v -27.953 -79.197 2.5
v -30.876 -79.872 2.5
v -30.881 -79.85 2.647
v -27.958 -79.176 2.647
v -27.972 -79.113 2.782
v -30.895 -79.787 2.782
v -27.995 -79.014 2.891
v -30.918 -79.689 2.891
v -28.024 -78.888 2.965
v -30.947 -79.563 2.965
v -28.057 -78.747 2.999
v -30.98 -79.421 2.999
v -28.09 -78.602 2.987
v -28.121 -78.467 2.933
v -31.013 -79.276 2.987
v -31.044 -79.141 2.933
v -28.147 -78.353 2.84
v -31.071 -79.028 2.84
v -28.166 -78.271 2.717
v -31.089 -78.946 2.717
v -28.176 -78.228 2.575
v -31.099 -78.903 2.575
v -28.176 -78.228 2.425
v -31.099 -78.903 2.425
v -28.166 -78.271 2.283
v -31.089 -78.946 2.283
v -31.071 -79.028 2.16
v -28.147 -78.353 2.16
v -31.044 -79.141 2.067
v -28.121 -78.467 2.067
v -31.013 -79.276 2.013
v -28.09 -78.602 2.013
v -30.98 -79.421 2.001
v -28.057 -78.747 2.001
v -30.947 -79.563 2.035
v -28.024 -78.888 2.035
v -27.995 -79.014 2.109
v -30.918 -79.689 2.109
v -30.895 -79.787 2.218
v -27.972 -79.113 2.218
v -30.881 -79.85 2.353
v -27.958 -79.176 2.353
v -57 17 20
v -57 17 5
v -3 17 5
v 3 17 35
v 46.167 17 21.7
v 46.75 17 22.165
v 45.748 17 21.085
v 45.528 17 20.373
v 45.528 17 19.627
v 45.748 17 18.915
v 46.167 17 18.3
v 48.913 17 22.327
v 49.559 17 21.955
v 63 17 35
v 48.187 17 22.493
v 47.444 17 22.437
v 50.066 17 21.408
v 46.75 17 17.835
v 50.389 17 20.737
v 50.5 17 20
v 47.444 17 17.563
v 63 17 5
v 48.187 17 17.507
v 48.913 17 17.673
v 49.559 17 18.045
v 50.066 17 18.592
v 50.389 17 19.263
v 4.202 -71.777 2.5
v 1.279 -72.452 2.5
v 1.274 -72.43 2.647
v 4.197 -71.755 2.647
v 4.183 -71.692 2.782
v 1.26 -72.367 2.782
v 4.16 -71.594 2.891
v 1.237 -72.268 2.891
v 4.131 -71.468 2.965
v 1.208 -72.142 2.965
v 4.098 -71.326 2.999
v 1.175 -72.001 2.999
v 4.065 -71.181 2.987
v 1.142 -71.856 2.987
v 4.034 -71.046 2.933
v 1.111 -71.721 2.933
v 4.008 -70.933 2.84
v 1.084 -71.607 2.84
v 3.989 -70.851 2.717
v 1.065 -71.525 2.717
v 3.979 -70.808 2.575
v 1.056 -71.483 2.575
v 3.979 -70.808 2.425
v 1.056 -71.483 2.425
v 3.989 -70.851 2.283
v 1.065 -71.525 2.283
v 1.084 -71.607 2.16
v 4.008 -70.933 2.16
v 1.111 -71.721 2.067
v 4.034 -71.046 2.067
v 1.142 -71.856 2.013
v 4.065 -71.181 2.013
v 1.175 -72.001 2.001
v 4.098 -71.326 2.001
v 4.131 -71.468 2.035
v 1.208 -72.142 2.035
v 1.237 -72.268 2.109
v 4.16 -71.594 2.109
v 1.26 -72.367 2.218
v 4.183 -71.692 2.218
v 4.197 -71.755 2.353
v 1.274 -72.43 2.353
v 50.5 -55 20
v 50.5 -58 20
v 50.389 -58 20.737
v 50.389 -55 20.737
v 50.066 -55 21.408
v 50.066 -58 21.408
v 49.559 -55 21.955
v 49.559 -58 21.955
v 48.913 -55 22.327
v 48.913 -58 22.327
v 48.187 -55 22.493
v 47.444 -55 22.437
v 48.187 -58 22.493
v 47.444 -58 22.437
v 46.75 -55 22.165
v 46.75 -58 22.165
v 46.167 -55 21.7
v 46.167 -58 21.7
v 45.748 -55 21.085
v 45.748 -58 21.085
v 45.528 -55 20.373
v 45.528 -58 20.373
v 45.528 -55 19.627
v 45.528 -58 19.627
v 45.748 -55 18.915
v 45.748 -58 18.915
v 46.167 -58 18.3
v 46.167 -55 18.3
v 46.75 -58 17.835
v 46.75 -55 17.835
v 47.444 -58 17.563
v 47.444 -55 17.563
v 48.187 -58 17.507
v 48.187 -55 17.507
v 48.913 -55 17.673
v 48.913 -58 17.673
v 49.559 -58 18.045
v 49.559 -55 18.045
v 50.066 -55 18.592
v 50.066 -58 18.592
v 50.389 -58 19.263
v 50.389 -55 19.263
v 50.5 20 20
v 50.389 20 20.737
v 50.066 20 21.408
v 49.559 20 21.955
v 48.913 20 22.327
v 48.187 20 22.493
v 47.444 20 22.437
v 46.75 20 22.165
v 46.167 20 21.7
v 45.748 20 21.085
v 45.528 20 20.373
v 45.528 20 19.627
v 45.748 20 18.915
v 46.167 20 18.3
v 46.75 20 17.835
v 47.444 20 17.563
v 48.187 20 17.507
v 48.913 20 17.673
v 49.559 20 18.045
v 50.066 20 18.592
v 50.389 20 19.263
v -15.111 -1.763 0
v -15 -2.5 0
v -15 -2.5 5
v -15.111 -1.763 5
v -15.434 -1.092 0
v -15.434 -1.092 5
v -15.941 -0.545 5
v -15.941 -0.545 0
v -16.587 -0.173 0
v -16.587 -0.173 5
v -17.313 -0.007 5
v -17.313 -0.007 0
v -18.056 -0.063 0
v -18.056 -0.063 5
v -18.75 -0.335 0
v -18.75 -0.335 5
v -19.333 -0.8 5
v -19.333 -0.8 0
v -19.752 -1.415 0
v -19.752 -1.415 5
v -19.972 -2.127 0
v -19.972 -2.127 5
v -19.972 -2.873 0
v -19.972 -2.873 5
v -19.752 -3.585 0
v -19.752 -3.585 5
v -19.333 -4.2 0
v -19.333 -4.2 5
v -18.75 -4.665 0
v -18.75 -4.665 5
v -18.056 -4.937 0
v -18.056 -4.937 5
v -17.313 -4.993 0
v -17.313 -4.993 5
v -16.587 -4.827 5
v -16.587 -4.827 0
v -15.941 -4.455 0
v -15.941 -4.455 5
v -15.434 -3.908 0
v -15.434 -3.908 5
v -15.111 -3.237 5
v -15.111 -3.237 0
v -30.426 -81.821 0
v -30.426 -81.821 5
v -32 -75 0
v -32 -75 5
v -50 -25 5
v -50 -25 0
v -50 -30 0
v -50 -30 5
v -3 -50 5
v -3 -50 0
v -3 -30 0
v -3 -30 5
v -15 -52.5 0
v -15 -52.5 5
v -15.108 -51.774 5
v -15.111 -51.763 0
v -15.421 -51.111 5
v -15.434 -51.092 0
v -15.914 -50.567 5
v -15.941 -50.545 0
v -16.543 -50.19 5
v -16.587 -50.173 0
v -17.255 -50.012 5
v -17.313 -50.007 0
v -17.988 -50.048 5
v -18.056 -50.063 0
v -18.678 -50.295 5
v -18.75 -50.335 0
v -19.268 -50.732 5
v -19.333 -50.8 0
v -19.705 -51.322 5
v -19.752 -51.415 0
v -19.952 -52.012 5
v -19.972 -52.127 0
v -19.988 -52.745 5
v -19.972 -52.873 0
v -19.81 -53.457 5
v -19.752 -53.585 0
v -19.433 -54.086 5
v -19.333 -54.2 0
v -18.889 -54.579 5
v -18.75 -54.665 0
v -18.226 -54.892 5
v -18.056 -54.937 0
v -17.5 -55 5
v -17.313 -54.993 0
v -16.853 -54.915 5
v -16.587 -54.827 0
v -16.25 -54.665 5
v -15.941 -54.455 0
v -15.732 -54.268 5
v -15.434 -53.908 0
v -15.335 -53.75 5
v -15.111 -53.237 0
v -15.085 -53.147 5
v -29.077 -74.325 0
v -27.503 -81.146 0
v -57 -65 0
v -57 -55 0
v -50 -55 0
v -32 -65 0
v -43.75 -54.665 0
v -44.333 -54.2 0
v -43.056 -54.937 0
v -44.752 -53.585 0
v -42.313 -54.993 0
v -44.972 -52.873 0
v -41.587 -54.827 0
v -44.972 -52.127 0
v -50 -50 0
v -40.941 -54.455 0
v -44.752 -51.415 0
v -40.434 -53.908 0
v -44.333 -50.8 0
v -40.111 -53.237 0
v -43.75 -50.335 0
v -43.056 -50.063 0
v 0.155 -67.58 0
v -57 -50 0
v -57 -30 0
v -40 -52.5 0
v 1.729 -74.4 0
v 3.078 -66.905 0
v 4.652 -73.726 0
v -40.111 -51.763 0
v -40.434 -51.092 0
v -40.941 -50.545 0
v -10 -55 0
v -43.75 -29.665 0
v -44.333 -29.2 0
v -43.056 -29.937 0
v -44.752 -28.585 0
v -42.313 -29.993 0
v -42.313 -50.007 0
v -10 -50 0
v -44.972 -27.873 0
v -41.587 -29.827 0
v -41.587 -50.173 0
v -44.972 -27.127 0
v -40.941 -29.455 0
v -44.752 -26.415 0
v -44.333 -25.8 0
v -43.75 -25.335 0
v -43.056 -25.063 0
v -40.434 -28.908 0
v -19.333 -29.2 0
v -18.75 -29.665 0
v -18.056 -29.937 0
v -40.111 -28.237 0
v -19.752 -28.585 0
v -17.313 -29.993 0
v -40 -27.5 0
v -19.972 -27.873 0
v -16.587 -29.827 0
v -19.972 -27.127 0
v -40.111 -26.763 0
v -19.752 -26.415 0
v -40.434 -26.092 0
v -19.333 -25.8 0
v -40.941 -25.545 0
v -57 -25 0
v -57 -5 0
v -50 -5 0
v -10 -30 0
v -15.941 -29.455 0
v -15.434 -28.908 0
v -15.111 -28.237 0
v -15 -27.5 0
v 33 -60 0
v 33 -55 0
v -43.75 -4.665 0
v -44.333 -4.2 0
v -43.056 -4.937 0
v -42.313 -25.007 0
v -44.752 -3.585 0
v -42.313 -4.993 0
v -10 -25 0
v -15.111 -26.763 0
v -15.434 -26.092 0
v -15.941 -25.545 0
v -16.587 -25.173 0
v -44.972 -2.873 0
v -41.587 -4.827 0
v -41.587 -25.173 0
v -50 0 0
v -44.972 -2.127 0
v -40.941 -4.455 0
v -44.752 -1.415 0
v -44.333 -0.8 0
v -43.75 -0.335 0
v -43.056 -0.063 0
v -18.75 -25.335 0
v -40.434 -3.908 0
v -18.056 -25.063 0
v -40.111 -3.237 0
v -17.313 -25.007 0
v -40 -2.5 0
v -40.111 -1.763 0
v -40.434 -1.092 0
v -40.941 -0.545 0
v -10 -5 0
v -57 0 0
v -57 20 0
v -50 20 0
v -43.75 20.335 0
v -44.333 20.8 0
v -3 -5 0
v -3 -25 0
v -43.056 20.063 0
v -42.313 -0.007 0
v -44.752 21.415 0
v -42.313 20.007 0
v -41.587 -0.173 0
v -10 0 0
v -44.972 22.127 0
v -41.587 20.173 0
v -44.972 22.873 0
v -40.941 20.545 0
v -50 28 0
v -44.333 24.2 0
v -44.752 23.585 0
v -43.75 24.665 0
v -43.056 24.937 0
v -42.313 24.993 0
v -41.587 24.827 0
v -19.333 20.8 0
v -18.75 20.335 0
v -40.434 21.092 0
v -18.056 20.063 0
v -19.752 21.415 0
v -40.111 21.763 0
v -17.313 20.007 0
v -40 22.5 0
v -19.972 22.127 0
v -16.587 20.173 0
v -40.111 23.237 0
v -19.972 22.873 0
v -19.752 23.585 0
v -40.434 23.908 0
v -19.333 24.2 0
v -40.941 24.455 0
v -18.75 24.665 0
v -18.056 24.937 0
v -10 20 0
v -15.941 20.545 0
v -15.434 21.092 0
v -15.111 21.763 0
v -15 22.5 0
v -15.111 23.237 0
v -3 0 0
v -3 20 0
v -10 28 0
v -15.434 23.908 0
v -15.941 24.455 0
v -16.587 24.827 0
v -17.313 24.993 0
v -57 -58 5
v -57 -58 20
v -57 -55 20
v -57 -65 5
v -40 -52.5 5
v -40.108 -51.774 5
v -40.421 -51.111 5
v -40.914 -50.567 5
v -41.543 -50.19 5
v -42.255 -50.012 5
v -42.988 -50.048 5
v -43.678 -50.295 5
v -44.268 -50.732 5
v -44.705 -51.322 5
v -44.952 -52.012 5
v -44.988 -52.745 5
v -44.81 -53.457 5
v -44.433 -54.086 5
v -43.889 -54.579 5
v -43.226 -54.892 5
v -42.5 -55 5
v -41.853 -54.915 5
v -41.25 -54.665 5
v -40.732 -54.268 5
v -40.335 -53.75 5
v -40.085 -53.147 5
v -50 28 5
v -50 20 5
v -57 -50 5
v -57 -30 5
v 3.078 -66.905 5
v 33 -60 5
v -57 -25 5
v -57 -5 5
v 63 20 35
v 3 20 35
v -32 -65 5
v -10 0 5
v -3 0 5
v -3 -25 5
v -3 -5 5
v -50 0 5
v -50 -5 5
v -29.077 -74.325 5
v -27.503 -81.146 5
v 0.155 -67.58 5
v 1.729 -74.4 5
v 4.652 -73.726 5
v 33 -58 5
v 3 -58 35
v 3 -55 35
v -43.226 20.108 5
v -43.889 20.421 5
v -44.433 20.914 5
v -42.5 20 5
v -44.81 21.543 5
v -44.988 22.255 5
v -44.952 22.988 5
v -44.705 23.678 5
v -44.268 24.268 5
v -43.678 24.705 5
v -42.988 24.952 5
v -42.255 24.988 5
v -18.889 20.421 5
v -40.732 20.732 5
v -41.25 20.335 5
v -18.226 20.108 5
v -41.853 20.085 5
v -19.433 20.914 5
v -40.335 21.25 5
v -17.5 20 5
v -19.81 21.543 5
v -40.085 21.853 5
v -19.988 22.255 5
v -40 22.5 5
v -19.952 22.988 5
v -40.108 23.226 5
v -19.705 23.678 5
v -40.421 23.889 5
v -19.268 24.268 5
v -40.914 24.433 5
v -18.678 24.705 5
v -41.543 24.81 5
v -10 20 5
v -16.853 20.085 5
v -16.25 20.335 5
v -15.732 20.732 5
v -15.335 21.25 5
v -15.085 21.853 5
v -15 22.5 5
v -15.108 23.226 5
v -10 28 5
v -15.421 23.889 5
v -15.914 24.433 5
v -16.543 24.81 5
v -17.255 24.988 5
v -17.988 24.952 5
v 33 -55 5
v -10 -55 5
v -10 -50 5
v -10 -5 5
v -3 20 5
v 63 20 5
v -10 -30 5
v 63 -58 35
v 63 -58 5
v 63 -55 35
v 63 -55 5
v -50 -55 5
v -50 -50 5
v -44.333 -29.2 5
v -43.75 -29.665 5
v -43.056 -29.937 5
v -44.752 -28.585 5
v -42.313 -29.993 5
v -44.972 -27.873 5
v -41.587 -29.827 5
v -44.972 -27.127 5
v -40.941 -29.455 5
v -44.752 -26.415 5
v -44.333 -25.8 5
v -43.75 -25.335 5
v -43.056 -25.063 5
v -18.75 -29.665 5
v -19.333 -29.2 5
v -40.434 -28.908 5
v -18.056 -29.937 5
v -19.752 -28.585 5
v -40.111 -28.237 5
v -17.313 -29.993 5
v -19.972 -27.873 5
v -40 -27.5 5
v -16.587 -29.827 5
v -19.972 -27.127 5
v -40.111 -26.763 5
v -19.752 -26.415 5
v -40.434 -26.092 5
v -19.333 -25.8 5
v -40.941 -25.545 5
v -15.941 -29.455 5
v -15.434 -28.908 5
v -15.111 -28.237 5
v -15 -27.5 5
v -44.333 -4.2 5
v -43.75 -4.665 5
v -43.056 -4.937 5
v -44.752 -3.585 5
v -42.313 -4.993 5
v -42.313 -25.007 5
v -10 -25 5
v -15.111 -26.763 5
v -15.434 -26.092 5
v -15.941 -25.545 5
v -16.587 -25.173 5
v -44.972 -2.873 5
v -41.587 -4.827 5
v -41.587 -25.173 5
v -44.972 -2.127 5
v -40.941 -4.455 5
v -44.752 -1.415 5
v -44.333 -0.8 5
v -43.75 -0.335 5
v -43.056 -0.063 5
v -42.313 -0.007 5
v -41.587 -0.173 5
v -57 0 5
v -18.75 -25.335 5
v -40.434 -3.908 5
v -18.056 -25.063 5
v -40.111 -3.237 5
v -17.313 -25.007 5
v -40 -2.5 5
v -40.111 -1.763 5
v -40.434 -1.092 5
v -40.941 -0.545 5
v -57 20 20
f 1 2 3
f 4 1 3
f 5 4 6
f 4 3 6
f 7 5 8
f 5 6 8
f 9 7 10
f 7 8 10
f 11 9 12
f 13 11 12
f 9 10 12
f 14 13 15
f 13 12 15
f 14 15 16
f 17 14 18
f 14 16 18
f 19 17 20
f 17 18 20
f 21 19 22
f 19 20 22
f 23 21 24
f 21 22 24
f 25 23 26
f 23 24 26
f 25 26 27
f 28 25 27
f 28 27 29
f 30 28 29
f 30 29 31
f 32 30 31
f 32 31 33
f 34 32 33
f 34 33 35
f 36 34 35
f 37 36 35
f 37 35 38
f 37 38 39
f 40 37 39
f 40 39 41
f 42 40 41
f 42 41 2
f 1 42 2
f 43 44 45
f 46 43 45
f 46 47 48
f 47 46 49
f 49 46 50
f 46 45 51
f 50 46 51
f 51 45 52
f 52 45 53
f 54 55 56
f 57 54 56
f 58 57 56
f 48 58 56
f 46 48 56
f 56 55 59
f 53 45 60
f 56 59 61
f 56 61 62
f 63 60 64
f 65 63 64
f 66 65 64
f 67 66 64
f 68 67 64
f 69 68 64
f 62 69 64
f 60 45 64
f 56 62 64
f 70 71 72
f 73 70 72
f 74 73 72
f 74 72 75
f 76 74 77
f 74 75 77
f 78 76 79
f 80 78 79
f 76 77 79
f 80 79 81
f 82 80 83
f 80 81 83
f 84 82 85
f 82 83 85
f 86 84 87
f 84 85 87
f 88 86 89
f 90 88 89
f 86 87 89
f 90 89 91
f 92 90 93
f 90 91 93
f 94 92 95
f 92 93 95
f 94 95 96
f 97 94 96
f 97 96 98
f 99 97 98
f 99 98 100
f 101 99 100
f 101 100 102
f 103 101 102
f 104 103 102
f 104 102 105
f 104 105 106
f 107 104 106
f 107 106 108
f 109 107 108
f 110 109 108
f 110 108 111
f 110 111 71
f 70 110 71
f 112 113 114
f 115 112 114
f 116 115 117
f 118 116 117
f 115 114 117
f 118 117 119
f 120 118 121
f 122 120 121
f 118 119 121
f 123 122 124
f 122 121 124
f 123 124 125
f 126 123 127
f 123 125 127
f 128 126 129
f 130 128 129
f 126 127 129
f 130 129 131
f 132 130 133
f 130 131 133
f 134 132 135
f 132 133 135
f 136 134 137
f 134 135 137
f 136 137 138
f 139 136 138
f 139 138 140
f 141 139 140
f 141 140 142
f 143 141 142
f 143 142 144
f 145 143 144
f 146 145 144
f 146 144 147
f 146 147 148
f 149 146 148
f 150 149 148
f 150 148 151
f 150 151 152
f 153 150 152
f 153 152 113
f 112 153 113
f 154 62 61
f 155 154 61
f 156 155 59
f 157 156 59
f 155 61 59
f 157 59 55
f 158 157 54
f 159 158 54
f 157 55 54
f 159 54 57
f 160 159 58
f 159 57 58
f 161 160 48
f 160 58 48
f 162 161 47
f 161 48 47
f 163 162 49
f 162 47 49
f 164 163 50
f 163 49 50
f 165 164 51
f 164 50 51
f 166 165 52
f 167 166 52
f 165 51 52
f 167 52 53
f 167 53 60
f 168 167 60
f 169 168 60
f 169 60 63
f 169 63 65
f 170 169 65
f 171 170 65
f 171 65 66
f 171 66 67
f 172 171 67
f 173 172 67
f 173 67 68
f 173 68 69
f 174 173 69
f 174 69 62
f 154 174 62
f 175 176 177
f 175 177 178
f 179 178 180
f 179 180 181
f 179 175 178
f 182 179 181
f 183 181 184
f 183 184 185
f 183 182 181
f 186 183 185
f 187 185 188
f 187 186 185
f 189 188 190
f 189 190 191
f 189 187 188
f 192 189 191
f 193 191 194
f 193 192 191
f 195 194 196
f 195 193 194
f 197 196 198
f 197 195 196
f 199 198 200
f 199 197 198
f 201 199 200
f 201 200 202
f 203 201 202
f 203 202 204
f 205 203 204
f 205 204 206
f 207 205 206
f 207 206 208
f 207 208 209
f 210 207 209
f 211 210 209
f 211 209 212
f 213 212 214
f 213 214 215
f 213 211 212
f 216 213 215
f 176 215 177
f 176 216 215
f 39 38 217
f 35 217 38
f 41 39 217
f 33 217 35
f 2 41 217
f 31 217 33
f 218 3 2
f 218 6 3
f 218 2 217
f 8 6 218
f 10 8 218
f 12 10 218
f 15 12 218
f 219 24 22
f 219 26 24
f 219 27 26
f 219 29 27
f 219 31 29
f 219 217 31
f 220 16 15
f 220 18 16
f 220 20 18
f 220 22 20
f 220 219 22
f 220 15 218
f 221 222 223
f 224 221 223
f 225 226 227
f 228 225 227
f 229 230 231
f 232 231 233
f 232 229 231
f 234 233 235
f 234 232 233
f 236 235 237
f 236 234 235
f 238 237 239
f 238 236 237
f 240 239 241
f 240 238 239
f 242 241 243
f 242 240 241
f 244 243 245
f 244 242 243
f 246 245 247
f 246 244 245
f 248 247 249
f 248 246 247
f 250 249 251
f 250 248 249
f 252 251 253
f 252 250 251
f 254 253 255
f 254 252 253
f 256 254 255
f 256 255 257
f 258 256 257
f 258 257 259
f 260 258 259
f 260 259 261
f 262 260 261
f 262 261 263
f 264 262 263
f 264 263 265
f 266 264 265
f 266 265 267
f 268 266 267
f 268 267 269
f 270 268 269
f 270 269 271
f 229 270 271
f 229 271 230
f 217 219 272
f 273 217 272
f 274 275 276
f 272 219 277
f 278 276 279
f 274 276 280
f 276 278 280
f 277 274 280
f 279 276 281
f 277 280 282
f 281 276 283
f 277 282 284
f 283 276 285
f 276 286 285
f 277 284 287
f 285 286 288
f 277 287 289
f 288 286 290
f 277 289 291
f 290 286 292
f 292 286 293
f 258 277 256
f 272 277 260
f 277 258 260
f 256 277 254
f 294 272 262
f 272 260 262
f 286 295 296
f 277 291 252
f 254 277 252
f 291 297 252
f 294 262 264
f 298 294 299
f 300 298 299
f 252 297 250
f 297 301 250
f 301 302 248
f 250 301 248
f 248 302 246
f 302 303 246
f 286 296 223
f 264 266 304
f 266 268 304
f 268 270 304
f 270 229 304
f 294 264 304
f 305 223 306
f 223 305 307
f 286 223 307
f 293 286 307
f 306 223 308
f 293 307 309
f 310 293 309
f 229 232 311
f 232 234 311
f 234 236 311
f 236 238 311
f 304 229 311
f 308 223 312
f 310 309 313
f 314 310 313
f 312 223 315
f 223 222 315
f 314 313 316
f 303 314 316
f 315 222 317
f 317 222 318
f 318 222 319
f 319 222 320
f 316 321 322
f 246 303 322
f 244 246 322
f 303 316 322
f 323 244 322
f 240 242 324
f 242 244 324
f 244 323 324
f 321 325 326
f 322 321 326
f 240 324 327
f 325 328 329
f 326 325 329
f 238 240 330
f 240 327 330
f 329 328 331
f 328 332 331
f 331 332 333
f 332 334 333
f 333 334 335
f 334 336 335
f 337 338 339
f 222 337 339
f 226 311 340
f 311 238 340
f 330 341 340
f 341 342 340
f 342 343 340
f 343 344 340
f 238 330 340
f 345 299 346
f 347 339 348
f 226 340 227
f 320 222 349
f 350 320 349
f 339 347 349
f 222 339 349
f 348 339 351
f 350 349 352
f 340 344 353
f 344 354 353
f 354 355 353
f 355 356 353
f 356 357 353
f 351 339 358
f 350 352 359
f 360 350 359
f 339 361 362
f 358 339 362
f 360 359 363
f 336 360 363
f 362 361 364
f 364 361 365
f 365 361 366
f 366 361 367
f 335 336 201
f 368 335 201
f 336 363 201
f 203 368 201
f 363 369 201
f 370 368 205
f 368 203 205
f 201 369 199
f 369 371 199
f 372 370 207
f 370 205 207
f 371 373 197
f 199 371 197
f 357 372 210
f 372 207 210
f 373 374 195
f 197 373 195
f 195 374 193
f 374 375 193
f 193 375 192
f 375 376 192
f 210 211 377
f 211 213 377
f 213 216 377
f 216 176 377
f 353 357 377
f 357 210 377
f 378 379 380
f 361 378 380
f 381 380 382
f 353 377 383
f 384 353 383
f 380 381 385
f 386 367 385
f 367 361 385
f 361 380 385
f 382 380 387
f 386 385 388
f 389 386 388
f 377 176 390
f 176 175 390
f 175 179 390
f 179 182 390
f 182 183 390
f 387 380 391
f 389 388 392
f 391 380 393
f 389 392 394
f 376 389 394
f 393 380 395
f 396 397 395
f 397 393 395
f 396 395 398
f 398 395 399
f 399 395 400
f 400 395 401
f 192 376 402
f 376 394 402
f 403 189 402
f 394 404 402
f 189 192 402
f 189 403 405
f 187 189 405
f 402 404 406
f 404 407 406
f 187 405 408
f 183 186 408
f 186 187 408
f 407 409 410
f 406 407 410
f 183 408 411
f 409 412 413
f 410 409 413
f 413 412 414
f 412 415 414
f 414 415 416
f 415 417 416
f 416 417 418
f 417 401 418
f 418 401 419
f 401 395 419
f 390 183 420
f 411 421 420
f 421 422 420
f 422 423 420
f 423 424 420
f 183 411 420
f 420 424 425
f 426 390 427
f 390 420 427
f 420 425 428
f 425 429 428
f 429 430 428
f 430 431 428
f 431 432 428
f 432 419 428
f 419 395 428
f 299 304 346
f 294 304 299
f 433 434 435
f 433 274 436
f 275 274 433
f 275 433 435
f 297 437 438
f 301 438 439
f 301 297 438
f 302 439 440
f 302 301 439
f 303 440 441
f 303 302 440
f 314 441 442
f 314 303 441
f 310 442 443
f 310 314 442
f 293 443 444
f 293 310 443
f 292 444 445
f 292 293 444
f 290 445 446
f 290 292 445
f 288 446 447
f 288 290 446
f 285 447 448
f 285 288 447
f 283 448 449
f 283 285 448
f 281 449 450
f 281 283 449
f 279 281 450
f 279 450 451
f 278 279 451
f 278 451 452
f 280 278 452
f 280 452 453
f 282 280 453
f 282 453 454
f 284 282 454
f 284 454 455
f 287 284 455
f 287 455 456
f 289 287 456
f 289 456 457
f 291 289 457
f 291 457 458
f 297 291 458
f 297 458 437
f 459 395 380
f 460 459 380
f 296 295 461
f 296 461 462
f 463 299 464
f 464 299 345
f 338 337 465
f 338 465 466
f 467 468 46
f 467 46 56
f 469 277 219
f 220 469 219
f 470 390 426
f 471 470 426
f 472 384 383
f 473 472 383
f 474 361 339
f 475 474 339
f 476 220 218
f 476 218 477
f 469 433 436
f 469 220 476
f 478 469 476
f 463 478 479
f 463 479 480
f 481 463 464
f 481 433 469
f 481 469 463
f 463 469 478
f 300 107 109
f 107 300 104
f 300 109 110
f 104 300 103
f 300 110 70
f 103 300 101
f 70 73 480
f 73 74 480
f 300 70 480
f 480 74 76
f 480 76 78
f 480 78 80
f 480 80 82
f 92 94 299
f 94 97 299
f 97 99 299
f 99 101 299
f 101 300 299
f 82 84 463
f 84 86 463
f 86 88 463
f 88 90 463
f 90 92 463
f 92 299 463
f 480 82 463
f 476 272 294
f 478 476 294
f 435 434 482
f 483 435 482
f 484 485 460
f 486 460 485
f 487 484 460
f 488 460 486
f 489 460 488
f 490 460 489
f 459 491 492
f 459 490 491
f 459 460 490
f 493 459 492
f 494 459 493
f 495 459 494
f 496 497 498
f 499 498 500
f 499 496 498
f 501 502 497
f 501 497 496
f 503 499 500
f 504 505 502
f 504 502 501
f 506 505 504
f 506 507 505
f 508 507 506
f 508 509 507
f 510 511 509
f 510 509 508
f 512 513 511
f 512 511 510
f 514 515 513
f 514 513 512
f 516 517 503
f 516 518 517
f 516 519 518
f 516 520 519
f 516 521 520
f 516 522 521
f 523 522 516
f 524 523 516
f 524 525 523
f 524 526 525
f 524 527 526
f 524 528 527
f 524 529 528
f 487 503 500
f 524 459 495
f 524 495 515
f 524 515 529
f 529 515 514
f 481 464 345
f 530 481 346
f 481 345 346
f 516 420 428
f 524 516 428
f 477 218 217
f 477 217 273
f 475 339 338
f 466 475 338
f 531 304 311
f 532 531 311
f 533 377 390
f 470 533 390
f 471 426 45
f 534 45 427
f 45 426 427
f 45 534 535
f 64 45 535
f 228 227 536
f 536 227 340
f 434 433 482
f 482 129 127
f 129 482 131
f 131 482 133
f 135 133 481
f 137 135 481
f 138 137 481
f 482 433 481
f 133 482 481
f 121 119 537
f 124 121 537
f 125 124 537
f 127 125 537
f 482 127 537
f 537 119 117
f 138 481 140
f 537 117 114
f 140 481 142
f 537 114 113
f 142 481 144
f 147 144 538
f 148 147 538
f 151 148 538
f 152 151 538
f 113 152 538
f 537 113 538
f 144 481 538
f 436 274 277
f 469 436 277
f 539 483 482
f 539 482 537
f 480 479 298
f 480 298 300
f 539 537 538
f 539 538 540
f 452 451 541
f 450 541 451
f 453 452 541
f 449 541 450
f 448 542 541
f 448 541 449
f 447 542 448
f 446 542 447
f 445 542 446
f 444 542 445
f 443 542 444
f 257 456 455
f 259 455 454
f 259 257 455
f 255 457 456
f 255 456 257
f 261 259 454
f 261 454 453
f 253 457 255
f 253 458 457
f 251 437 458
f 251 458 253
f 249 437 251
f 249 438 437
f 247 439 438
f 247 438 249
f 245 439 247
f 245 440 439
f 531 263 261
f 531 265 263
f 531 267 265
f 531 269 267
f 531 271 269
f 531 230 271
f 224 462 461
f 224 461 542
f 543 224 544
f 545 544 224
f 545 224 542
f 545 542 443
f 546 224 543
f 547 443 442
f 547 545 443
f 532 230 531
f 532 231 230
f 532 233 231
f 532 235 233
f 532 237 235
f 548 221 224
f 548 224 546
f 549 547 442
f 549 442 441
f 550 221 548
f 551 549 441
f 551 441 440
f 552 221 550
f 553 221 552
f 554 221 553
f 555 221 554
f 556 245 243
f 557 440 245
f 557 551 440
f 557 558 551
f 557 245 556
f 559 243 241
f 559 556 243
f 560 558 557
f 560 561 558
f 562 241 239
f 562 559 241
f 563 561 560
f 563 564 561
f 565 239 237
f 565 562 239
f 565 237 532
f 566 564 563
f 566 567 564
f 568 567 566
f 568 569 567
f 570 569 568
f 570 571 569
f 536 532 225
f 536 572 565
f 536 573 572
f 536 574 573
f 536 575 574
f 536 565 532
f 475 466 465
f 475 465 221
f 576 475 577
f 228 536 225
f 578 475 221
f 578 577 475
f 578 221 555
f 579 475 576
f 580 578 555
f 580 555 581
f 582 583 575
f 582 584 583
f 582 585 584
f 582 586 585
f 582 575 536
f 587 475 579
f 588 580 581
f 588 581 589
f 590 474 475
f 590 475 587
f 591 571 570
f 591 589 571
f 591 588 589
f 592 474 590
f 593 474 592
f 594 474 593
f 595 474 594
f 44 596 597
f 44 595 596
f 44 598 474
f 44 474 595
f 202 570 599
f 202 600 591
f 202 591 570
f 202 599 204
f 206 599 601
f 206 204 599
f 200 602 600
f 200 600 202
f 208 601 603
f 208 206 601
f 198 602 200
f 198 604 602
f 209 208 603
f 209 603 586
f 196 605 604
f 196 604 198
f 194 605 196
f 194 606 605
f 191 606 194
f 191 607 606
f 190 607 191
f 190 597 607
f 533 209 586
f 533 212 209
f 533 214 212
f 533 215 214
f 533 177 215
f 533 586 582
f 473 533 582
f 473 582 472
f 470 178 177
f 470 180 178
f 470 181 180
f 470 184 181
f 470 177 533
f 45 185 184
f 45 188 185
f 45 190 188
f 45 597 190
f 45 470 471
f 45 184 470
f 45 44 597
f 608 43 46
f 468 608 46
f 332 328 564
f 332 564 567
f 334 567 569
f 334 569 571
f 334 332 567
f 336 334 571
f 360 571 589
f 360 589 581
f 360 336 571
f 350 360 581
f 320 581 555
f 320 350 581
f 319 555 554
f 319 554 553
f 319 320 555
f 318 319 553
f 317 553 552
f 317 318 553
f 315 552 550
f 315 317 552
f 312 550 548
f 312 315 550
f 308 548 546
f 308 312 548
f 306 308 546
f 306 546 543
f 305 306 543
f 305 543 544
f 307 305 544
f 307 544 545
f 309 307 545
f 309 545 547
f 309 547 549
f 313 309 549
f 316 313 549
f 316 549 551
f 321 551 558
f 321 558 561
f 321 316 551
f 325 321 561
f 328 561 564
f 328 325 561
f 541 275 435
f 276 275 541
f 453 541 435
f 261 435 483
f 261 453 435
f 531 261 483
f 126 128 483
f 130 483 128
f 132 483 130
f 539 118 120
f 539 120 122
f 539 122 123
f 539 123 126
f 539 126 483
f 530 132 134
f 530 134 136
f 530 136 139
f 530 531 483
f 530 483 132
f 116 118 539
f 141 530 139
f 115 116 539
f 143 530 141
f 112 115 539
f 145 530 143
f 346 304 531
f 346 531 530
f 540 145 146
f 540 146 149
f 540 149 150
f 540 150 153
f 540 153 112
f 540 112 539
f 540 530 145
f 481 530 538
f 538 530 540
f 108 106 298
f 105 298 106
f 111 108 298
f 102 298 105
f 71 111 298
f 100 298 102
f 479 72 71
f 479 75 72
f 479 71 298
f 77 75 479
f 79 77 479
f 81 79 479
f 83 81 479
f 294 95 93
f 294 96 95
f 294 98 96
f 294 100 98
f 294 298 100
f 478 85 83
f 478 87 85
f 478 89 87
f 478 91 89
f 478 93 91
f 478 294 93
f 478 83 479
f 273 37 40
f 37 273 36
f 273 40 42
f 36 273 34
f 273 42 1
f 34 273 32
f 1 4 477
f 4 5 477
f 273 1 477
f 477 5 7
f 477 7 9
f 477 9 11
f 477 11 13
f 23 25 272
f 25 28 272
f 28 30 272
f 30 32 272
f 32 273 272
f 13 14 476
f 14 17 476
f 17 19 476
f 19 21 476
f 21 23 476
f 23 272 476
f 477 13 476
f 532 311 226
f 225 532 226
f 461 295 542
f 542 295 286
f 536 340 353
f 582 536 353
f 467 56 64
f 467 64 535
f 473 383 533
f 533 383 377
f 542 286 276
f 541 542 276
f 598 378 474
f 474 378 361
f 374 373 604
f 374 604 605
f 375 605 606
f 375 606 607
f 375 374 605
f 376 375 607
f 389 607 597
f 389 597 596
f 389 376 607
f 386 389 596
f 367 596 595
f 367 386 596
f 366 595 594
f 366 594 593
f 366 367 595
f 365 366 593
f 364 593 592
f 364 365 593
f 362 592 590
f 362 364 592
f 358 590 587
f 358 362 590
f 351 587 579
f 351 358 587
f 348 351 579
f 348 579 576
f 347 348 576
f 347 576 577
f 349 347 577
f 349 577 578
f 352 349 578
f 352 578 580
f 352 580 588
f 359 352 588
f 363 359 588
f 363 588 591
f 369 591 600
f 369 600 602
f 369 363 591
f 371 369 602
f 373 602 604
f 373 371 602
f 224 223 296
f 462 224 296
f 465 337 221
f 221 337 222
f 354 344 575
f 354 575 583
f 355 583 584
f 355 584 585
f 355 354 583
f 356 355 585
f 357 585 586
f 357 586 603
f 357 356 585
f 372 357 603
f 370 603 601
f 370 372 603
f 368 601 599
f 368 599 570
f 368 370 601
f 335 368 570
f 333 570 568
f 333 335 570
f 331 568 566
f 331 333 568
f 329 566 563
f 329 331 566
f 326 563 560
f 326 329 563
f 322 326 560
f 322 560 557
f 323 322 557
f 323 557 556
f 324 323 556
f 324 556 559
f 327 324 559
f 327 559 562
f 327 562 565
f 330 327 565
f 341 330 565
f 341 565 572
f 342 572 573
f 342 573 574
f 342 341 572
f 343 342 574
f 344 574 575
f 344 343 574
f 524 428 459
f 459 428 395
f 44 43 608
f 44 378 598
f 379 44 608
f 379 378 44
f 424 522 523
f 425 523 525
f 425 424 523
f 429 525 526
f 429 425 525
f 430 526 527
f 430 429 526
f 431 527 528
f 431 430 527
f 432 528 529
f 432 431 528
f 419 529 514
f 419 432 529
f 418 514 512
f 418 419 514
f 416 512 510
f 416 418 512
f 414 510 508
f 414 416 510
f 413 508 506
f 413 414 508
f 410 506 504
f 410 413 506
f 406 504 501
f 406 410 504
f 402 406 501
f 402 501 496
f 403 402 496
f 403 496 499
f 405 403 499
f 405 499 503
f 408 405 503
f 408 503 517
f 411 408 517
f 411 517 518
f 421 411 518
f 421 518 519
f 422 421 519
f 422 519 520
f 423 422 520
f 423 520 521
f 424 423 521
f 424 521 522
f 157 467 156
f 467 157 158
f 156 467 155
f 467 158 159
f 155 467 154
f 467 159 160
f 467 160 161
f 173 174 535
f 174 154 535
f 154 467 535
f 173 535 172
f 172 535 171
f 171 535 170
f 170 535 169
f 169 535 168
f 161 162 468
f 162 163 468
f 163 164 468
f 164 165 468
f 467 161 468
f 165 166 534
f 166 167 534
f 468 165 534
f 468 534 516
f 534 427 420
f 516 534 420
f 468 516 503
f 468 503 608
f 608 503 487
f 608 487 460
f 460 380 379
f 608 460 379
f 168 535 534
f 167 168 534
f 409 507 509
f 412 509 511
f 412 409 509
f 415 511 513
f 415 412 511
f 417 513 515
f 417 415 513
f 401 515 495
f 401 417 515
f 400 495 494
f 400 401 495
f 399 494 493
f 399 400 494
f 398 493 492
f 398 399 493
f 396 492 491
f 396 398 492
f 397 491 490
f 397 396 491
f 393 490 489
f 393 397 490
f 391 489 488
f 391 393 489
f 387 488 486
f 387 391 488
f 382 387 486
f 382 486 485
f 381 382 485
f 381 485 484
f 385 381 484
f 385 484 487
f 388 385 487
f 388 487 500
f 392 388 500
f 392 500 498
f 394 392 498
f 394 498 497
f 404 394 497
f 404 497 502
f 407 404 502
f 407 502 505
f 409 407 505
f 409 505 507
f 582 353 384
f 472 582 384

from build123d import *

# Parameters (mm, degrees)
SKETCH1_R           = 2.5
BOSS_EXTRUDE1_DEPTH = 5
SKETCH2_W           = 3
SKETCH2_H           = 70
CUT_EXTRUDE3_DEPTH  = 10
SKETCH7_W           = 3
SKETCH7_H           = 5
BOSS_EXTRUDE5_DEPTH = 7
SKETCH8_R           = 0.5
CUT_EXTRUDE5_DEPTH  = 40
SKETCH9_W           = 120
SKETCH9_H           = 3
BOSS_EXTRUDE6_DEPTH = 30
SKETCH10_R          = 2.5
CUT_EXTRUDE6_DEPTH  = 100


with BuildPart() as part:
    # Sketch1 → Boss-Extrude1 (new body)
    with BuildSketch(Plane.XY):
        Polygon((-50, 20), (-60, 20), (-60, 0), (-50, 0), (-50, -5), (-60, -5), (-60, -25), (-50, -25), (-50, -30), (-60, -30), (-60, -50), (-50, -50), (-50, -55), (-57, -55), (-57, -65), (-32, -65), (-32, -75), (33, -60), (33, -55), (-10, -55), (-10, -50), (0, -50), (0, -30), (-10, -30), (-10, -25), (0, -25), (0, -5), (-10, -5), (-10, 0), (0, 0), (0, 20), (-10, 20), (-10, 28), (-50, 28), align=None)
        with Locations((-42.5, 22.5)):
            Circle(SKETCH1_R, mode=Mode.SUBTRACT)
        with Locations((-17.5, 22.5)):
            Circle(SKETCH1_R, mode=Mode.SUBTRACT)
        with Locations((-42.5, -2.5)):
            Circle(SKETCH1_R, mode=Mode.SUBTRACT)
        with Locations((-17.5, -2.5)):
            Circle(SKETCH1_R, mode=Mode.SUBTRACT)
        with Locations((-17.5, -27.5)):
            Circle(SKETCH1_R, mode=Mode.SUBTRACT)
        with Locations((-42.5, -27.5)):
            Circle(SKETCH1_R, mode=Mode.SUBTRACT)
        with Locations((-17.5, -52.5)):
            Circle(SKETCH1_R, mode=Mode.SUBTRACT)
        with Locations((-42.5, -52.5)):
            Circle(SKETCH1_R, mode=Mode.SUBTRACT)
    extrude(amount=BOSS_EXTRUDE1_DEPTH)

    # Sketch2 → Cut-Extrude3 (cut)
    with BuildSketch(Plane(origin=(0, 0, 0), x_dir=(-1, 0, 0), z_dir=(0, 0, -1))):
        with Locations((58.5, -15)):
            Rectangle(SKETCH2_W, SKETCH2_H)
        with Locations((1.5, -15)):
            Rectangle(SKETCH2_W, SKETCH2_H)
    extrude(amount=-CUT_EXTRUDE3_DEPTH, mode=Mode.SUBTRACT)

    # Sketch7 → Boss-Extrude5 (add)
    with BuildSketch(Plane(origin=(14.814606742, -64.196629213, 0), x_dir=(0.97439119569462, 0.22485950669875845, 0), z_dir=(0.22485950669875845, -0.97439119569462, 0))):
        with Locations((-46.544981265, 2.5)):
            Rectangle(SKETCH7_W, SKETCH7_H)
        with Locations((-13.544981265, 2.5)):
            Rectangle(SKETCH7_W, SKETCH7_H)
    extrude(amount=BOSS_EXTRUDE5_DEPTH)

    # Sketch8 → Cut-Extrude5 (cut)
    with BuildSketch(Plane(origin=(-46.814606742, -10.803370787, 0), x_dir=(0, 0, 1), z_dir=(-0.97439119569462, -0.22485950669875848, 0))):
        with Locations((2.5, -70.383835463)):
            Circle(SKETCH8_R)
    extrude(amount=-CUT_EXTRUDE5_DEPTH, mode=Mode.SUBTRACT)

    # Sketch9 → Boss-Extrude6 (add)
    with BuildSketch(Plane.XY.offset(5)):
        with Locations((3, -56.5)):
            Rectangle(SKETCH9_W, SKETCH9_H)
        with Locations((3, 18.5)):
            Rectangle(SKETCH9_W, SKETCH9_H)
    extrude(amount=BOSS_EXTRUDE6_DEPTH)

    # Sketch10 → Cut-Extrude6 (cut)
    with BuildSketch(Plane.XZ.offset(58)):
        with Locations((48, 20)):
            Circle(SKETCH10_R)
        Polygon((-57, 20), (3, 35), (-57, 35), align=None)
    extrude(amount=-CUT_EXTRUDE6_DEPTH, mode=Mode.SUBTRACT)


solid = part.part
